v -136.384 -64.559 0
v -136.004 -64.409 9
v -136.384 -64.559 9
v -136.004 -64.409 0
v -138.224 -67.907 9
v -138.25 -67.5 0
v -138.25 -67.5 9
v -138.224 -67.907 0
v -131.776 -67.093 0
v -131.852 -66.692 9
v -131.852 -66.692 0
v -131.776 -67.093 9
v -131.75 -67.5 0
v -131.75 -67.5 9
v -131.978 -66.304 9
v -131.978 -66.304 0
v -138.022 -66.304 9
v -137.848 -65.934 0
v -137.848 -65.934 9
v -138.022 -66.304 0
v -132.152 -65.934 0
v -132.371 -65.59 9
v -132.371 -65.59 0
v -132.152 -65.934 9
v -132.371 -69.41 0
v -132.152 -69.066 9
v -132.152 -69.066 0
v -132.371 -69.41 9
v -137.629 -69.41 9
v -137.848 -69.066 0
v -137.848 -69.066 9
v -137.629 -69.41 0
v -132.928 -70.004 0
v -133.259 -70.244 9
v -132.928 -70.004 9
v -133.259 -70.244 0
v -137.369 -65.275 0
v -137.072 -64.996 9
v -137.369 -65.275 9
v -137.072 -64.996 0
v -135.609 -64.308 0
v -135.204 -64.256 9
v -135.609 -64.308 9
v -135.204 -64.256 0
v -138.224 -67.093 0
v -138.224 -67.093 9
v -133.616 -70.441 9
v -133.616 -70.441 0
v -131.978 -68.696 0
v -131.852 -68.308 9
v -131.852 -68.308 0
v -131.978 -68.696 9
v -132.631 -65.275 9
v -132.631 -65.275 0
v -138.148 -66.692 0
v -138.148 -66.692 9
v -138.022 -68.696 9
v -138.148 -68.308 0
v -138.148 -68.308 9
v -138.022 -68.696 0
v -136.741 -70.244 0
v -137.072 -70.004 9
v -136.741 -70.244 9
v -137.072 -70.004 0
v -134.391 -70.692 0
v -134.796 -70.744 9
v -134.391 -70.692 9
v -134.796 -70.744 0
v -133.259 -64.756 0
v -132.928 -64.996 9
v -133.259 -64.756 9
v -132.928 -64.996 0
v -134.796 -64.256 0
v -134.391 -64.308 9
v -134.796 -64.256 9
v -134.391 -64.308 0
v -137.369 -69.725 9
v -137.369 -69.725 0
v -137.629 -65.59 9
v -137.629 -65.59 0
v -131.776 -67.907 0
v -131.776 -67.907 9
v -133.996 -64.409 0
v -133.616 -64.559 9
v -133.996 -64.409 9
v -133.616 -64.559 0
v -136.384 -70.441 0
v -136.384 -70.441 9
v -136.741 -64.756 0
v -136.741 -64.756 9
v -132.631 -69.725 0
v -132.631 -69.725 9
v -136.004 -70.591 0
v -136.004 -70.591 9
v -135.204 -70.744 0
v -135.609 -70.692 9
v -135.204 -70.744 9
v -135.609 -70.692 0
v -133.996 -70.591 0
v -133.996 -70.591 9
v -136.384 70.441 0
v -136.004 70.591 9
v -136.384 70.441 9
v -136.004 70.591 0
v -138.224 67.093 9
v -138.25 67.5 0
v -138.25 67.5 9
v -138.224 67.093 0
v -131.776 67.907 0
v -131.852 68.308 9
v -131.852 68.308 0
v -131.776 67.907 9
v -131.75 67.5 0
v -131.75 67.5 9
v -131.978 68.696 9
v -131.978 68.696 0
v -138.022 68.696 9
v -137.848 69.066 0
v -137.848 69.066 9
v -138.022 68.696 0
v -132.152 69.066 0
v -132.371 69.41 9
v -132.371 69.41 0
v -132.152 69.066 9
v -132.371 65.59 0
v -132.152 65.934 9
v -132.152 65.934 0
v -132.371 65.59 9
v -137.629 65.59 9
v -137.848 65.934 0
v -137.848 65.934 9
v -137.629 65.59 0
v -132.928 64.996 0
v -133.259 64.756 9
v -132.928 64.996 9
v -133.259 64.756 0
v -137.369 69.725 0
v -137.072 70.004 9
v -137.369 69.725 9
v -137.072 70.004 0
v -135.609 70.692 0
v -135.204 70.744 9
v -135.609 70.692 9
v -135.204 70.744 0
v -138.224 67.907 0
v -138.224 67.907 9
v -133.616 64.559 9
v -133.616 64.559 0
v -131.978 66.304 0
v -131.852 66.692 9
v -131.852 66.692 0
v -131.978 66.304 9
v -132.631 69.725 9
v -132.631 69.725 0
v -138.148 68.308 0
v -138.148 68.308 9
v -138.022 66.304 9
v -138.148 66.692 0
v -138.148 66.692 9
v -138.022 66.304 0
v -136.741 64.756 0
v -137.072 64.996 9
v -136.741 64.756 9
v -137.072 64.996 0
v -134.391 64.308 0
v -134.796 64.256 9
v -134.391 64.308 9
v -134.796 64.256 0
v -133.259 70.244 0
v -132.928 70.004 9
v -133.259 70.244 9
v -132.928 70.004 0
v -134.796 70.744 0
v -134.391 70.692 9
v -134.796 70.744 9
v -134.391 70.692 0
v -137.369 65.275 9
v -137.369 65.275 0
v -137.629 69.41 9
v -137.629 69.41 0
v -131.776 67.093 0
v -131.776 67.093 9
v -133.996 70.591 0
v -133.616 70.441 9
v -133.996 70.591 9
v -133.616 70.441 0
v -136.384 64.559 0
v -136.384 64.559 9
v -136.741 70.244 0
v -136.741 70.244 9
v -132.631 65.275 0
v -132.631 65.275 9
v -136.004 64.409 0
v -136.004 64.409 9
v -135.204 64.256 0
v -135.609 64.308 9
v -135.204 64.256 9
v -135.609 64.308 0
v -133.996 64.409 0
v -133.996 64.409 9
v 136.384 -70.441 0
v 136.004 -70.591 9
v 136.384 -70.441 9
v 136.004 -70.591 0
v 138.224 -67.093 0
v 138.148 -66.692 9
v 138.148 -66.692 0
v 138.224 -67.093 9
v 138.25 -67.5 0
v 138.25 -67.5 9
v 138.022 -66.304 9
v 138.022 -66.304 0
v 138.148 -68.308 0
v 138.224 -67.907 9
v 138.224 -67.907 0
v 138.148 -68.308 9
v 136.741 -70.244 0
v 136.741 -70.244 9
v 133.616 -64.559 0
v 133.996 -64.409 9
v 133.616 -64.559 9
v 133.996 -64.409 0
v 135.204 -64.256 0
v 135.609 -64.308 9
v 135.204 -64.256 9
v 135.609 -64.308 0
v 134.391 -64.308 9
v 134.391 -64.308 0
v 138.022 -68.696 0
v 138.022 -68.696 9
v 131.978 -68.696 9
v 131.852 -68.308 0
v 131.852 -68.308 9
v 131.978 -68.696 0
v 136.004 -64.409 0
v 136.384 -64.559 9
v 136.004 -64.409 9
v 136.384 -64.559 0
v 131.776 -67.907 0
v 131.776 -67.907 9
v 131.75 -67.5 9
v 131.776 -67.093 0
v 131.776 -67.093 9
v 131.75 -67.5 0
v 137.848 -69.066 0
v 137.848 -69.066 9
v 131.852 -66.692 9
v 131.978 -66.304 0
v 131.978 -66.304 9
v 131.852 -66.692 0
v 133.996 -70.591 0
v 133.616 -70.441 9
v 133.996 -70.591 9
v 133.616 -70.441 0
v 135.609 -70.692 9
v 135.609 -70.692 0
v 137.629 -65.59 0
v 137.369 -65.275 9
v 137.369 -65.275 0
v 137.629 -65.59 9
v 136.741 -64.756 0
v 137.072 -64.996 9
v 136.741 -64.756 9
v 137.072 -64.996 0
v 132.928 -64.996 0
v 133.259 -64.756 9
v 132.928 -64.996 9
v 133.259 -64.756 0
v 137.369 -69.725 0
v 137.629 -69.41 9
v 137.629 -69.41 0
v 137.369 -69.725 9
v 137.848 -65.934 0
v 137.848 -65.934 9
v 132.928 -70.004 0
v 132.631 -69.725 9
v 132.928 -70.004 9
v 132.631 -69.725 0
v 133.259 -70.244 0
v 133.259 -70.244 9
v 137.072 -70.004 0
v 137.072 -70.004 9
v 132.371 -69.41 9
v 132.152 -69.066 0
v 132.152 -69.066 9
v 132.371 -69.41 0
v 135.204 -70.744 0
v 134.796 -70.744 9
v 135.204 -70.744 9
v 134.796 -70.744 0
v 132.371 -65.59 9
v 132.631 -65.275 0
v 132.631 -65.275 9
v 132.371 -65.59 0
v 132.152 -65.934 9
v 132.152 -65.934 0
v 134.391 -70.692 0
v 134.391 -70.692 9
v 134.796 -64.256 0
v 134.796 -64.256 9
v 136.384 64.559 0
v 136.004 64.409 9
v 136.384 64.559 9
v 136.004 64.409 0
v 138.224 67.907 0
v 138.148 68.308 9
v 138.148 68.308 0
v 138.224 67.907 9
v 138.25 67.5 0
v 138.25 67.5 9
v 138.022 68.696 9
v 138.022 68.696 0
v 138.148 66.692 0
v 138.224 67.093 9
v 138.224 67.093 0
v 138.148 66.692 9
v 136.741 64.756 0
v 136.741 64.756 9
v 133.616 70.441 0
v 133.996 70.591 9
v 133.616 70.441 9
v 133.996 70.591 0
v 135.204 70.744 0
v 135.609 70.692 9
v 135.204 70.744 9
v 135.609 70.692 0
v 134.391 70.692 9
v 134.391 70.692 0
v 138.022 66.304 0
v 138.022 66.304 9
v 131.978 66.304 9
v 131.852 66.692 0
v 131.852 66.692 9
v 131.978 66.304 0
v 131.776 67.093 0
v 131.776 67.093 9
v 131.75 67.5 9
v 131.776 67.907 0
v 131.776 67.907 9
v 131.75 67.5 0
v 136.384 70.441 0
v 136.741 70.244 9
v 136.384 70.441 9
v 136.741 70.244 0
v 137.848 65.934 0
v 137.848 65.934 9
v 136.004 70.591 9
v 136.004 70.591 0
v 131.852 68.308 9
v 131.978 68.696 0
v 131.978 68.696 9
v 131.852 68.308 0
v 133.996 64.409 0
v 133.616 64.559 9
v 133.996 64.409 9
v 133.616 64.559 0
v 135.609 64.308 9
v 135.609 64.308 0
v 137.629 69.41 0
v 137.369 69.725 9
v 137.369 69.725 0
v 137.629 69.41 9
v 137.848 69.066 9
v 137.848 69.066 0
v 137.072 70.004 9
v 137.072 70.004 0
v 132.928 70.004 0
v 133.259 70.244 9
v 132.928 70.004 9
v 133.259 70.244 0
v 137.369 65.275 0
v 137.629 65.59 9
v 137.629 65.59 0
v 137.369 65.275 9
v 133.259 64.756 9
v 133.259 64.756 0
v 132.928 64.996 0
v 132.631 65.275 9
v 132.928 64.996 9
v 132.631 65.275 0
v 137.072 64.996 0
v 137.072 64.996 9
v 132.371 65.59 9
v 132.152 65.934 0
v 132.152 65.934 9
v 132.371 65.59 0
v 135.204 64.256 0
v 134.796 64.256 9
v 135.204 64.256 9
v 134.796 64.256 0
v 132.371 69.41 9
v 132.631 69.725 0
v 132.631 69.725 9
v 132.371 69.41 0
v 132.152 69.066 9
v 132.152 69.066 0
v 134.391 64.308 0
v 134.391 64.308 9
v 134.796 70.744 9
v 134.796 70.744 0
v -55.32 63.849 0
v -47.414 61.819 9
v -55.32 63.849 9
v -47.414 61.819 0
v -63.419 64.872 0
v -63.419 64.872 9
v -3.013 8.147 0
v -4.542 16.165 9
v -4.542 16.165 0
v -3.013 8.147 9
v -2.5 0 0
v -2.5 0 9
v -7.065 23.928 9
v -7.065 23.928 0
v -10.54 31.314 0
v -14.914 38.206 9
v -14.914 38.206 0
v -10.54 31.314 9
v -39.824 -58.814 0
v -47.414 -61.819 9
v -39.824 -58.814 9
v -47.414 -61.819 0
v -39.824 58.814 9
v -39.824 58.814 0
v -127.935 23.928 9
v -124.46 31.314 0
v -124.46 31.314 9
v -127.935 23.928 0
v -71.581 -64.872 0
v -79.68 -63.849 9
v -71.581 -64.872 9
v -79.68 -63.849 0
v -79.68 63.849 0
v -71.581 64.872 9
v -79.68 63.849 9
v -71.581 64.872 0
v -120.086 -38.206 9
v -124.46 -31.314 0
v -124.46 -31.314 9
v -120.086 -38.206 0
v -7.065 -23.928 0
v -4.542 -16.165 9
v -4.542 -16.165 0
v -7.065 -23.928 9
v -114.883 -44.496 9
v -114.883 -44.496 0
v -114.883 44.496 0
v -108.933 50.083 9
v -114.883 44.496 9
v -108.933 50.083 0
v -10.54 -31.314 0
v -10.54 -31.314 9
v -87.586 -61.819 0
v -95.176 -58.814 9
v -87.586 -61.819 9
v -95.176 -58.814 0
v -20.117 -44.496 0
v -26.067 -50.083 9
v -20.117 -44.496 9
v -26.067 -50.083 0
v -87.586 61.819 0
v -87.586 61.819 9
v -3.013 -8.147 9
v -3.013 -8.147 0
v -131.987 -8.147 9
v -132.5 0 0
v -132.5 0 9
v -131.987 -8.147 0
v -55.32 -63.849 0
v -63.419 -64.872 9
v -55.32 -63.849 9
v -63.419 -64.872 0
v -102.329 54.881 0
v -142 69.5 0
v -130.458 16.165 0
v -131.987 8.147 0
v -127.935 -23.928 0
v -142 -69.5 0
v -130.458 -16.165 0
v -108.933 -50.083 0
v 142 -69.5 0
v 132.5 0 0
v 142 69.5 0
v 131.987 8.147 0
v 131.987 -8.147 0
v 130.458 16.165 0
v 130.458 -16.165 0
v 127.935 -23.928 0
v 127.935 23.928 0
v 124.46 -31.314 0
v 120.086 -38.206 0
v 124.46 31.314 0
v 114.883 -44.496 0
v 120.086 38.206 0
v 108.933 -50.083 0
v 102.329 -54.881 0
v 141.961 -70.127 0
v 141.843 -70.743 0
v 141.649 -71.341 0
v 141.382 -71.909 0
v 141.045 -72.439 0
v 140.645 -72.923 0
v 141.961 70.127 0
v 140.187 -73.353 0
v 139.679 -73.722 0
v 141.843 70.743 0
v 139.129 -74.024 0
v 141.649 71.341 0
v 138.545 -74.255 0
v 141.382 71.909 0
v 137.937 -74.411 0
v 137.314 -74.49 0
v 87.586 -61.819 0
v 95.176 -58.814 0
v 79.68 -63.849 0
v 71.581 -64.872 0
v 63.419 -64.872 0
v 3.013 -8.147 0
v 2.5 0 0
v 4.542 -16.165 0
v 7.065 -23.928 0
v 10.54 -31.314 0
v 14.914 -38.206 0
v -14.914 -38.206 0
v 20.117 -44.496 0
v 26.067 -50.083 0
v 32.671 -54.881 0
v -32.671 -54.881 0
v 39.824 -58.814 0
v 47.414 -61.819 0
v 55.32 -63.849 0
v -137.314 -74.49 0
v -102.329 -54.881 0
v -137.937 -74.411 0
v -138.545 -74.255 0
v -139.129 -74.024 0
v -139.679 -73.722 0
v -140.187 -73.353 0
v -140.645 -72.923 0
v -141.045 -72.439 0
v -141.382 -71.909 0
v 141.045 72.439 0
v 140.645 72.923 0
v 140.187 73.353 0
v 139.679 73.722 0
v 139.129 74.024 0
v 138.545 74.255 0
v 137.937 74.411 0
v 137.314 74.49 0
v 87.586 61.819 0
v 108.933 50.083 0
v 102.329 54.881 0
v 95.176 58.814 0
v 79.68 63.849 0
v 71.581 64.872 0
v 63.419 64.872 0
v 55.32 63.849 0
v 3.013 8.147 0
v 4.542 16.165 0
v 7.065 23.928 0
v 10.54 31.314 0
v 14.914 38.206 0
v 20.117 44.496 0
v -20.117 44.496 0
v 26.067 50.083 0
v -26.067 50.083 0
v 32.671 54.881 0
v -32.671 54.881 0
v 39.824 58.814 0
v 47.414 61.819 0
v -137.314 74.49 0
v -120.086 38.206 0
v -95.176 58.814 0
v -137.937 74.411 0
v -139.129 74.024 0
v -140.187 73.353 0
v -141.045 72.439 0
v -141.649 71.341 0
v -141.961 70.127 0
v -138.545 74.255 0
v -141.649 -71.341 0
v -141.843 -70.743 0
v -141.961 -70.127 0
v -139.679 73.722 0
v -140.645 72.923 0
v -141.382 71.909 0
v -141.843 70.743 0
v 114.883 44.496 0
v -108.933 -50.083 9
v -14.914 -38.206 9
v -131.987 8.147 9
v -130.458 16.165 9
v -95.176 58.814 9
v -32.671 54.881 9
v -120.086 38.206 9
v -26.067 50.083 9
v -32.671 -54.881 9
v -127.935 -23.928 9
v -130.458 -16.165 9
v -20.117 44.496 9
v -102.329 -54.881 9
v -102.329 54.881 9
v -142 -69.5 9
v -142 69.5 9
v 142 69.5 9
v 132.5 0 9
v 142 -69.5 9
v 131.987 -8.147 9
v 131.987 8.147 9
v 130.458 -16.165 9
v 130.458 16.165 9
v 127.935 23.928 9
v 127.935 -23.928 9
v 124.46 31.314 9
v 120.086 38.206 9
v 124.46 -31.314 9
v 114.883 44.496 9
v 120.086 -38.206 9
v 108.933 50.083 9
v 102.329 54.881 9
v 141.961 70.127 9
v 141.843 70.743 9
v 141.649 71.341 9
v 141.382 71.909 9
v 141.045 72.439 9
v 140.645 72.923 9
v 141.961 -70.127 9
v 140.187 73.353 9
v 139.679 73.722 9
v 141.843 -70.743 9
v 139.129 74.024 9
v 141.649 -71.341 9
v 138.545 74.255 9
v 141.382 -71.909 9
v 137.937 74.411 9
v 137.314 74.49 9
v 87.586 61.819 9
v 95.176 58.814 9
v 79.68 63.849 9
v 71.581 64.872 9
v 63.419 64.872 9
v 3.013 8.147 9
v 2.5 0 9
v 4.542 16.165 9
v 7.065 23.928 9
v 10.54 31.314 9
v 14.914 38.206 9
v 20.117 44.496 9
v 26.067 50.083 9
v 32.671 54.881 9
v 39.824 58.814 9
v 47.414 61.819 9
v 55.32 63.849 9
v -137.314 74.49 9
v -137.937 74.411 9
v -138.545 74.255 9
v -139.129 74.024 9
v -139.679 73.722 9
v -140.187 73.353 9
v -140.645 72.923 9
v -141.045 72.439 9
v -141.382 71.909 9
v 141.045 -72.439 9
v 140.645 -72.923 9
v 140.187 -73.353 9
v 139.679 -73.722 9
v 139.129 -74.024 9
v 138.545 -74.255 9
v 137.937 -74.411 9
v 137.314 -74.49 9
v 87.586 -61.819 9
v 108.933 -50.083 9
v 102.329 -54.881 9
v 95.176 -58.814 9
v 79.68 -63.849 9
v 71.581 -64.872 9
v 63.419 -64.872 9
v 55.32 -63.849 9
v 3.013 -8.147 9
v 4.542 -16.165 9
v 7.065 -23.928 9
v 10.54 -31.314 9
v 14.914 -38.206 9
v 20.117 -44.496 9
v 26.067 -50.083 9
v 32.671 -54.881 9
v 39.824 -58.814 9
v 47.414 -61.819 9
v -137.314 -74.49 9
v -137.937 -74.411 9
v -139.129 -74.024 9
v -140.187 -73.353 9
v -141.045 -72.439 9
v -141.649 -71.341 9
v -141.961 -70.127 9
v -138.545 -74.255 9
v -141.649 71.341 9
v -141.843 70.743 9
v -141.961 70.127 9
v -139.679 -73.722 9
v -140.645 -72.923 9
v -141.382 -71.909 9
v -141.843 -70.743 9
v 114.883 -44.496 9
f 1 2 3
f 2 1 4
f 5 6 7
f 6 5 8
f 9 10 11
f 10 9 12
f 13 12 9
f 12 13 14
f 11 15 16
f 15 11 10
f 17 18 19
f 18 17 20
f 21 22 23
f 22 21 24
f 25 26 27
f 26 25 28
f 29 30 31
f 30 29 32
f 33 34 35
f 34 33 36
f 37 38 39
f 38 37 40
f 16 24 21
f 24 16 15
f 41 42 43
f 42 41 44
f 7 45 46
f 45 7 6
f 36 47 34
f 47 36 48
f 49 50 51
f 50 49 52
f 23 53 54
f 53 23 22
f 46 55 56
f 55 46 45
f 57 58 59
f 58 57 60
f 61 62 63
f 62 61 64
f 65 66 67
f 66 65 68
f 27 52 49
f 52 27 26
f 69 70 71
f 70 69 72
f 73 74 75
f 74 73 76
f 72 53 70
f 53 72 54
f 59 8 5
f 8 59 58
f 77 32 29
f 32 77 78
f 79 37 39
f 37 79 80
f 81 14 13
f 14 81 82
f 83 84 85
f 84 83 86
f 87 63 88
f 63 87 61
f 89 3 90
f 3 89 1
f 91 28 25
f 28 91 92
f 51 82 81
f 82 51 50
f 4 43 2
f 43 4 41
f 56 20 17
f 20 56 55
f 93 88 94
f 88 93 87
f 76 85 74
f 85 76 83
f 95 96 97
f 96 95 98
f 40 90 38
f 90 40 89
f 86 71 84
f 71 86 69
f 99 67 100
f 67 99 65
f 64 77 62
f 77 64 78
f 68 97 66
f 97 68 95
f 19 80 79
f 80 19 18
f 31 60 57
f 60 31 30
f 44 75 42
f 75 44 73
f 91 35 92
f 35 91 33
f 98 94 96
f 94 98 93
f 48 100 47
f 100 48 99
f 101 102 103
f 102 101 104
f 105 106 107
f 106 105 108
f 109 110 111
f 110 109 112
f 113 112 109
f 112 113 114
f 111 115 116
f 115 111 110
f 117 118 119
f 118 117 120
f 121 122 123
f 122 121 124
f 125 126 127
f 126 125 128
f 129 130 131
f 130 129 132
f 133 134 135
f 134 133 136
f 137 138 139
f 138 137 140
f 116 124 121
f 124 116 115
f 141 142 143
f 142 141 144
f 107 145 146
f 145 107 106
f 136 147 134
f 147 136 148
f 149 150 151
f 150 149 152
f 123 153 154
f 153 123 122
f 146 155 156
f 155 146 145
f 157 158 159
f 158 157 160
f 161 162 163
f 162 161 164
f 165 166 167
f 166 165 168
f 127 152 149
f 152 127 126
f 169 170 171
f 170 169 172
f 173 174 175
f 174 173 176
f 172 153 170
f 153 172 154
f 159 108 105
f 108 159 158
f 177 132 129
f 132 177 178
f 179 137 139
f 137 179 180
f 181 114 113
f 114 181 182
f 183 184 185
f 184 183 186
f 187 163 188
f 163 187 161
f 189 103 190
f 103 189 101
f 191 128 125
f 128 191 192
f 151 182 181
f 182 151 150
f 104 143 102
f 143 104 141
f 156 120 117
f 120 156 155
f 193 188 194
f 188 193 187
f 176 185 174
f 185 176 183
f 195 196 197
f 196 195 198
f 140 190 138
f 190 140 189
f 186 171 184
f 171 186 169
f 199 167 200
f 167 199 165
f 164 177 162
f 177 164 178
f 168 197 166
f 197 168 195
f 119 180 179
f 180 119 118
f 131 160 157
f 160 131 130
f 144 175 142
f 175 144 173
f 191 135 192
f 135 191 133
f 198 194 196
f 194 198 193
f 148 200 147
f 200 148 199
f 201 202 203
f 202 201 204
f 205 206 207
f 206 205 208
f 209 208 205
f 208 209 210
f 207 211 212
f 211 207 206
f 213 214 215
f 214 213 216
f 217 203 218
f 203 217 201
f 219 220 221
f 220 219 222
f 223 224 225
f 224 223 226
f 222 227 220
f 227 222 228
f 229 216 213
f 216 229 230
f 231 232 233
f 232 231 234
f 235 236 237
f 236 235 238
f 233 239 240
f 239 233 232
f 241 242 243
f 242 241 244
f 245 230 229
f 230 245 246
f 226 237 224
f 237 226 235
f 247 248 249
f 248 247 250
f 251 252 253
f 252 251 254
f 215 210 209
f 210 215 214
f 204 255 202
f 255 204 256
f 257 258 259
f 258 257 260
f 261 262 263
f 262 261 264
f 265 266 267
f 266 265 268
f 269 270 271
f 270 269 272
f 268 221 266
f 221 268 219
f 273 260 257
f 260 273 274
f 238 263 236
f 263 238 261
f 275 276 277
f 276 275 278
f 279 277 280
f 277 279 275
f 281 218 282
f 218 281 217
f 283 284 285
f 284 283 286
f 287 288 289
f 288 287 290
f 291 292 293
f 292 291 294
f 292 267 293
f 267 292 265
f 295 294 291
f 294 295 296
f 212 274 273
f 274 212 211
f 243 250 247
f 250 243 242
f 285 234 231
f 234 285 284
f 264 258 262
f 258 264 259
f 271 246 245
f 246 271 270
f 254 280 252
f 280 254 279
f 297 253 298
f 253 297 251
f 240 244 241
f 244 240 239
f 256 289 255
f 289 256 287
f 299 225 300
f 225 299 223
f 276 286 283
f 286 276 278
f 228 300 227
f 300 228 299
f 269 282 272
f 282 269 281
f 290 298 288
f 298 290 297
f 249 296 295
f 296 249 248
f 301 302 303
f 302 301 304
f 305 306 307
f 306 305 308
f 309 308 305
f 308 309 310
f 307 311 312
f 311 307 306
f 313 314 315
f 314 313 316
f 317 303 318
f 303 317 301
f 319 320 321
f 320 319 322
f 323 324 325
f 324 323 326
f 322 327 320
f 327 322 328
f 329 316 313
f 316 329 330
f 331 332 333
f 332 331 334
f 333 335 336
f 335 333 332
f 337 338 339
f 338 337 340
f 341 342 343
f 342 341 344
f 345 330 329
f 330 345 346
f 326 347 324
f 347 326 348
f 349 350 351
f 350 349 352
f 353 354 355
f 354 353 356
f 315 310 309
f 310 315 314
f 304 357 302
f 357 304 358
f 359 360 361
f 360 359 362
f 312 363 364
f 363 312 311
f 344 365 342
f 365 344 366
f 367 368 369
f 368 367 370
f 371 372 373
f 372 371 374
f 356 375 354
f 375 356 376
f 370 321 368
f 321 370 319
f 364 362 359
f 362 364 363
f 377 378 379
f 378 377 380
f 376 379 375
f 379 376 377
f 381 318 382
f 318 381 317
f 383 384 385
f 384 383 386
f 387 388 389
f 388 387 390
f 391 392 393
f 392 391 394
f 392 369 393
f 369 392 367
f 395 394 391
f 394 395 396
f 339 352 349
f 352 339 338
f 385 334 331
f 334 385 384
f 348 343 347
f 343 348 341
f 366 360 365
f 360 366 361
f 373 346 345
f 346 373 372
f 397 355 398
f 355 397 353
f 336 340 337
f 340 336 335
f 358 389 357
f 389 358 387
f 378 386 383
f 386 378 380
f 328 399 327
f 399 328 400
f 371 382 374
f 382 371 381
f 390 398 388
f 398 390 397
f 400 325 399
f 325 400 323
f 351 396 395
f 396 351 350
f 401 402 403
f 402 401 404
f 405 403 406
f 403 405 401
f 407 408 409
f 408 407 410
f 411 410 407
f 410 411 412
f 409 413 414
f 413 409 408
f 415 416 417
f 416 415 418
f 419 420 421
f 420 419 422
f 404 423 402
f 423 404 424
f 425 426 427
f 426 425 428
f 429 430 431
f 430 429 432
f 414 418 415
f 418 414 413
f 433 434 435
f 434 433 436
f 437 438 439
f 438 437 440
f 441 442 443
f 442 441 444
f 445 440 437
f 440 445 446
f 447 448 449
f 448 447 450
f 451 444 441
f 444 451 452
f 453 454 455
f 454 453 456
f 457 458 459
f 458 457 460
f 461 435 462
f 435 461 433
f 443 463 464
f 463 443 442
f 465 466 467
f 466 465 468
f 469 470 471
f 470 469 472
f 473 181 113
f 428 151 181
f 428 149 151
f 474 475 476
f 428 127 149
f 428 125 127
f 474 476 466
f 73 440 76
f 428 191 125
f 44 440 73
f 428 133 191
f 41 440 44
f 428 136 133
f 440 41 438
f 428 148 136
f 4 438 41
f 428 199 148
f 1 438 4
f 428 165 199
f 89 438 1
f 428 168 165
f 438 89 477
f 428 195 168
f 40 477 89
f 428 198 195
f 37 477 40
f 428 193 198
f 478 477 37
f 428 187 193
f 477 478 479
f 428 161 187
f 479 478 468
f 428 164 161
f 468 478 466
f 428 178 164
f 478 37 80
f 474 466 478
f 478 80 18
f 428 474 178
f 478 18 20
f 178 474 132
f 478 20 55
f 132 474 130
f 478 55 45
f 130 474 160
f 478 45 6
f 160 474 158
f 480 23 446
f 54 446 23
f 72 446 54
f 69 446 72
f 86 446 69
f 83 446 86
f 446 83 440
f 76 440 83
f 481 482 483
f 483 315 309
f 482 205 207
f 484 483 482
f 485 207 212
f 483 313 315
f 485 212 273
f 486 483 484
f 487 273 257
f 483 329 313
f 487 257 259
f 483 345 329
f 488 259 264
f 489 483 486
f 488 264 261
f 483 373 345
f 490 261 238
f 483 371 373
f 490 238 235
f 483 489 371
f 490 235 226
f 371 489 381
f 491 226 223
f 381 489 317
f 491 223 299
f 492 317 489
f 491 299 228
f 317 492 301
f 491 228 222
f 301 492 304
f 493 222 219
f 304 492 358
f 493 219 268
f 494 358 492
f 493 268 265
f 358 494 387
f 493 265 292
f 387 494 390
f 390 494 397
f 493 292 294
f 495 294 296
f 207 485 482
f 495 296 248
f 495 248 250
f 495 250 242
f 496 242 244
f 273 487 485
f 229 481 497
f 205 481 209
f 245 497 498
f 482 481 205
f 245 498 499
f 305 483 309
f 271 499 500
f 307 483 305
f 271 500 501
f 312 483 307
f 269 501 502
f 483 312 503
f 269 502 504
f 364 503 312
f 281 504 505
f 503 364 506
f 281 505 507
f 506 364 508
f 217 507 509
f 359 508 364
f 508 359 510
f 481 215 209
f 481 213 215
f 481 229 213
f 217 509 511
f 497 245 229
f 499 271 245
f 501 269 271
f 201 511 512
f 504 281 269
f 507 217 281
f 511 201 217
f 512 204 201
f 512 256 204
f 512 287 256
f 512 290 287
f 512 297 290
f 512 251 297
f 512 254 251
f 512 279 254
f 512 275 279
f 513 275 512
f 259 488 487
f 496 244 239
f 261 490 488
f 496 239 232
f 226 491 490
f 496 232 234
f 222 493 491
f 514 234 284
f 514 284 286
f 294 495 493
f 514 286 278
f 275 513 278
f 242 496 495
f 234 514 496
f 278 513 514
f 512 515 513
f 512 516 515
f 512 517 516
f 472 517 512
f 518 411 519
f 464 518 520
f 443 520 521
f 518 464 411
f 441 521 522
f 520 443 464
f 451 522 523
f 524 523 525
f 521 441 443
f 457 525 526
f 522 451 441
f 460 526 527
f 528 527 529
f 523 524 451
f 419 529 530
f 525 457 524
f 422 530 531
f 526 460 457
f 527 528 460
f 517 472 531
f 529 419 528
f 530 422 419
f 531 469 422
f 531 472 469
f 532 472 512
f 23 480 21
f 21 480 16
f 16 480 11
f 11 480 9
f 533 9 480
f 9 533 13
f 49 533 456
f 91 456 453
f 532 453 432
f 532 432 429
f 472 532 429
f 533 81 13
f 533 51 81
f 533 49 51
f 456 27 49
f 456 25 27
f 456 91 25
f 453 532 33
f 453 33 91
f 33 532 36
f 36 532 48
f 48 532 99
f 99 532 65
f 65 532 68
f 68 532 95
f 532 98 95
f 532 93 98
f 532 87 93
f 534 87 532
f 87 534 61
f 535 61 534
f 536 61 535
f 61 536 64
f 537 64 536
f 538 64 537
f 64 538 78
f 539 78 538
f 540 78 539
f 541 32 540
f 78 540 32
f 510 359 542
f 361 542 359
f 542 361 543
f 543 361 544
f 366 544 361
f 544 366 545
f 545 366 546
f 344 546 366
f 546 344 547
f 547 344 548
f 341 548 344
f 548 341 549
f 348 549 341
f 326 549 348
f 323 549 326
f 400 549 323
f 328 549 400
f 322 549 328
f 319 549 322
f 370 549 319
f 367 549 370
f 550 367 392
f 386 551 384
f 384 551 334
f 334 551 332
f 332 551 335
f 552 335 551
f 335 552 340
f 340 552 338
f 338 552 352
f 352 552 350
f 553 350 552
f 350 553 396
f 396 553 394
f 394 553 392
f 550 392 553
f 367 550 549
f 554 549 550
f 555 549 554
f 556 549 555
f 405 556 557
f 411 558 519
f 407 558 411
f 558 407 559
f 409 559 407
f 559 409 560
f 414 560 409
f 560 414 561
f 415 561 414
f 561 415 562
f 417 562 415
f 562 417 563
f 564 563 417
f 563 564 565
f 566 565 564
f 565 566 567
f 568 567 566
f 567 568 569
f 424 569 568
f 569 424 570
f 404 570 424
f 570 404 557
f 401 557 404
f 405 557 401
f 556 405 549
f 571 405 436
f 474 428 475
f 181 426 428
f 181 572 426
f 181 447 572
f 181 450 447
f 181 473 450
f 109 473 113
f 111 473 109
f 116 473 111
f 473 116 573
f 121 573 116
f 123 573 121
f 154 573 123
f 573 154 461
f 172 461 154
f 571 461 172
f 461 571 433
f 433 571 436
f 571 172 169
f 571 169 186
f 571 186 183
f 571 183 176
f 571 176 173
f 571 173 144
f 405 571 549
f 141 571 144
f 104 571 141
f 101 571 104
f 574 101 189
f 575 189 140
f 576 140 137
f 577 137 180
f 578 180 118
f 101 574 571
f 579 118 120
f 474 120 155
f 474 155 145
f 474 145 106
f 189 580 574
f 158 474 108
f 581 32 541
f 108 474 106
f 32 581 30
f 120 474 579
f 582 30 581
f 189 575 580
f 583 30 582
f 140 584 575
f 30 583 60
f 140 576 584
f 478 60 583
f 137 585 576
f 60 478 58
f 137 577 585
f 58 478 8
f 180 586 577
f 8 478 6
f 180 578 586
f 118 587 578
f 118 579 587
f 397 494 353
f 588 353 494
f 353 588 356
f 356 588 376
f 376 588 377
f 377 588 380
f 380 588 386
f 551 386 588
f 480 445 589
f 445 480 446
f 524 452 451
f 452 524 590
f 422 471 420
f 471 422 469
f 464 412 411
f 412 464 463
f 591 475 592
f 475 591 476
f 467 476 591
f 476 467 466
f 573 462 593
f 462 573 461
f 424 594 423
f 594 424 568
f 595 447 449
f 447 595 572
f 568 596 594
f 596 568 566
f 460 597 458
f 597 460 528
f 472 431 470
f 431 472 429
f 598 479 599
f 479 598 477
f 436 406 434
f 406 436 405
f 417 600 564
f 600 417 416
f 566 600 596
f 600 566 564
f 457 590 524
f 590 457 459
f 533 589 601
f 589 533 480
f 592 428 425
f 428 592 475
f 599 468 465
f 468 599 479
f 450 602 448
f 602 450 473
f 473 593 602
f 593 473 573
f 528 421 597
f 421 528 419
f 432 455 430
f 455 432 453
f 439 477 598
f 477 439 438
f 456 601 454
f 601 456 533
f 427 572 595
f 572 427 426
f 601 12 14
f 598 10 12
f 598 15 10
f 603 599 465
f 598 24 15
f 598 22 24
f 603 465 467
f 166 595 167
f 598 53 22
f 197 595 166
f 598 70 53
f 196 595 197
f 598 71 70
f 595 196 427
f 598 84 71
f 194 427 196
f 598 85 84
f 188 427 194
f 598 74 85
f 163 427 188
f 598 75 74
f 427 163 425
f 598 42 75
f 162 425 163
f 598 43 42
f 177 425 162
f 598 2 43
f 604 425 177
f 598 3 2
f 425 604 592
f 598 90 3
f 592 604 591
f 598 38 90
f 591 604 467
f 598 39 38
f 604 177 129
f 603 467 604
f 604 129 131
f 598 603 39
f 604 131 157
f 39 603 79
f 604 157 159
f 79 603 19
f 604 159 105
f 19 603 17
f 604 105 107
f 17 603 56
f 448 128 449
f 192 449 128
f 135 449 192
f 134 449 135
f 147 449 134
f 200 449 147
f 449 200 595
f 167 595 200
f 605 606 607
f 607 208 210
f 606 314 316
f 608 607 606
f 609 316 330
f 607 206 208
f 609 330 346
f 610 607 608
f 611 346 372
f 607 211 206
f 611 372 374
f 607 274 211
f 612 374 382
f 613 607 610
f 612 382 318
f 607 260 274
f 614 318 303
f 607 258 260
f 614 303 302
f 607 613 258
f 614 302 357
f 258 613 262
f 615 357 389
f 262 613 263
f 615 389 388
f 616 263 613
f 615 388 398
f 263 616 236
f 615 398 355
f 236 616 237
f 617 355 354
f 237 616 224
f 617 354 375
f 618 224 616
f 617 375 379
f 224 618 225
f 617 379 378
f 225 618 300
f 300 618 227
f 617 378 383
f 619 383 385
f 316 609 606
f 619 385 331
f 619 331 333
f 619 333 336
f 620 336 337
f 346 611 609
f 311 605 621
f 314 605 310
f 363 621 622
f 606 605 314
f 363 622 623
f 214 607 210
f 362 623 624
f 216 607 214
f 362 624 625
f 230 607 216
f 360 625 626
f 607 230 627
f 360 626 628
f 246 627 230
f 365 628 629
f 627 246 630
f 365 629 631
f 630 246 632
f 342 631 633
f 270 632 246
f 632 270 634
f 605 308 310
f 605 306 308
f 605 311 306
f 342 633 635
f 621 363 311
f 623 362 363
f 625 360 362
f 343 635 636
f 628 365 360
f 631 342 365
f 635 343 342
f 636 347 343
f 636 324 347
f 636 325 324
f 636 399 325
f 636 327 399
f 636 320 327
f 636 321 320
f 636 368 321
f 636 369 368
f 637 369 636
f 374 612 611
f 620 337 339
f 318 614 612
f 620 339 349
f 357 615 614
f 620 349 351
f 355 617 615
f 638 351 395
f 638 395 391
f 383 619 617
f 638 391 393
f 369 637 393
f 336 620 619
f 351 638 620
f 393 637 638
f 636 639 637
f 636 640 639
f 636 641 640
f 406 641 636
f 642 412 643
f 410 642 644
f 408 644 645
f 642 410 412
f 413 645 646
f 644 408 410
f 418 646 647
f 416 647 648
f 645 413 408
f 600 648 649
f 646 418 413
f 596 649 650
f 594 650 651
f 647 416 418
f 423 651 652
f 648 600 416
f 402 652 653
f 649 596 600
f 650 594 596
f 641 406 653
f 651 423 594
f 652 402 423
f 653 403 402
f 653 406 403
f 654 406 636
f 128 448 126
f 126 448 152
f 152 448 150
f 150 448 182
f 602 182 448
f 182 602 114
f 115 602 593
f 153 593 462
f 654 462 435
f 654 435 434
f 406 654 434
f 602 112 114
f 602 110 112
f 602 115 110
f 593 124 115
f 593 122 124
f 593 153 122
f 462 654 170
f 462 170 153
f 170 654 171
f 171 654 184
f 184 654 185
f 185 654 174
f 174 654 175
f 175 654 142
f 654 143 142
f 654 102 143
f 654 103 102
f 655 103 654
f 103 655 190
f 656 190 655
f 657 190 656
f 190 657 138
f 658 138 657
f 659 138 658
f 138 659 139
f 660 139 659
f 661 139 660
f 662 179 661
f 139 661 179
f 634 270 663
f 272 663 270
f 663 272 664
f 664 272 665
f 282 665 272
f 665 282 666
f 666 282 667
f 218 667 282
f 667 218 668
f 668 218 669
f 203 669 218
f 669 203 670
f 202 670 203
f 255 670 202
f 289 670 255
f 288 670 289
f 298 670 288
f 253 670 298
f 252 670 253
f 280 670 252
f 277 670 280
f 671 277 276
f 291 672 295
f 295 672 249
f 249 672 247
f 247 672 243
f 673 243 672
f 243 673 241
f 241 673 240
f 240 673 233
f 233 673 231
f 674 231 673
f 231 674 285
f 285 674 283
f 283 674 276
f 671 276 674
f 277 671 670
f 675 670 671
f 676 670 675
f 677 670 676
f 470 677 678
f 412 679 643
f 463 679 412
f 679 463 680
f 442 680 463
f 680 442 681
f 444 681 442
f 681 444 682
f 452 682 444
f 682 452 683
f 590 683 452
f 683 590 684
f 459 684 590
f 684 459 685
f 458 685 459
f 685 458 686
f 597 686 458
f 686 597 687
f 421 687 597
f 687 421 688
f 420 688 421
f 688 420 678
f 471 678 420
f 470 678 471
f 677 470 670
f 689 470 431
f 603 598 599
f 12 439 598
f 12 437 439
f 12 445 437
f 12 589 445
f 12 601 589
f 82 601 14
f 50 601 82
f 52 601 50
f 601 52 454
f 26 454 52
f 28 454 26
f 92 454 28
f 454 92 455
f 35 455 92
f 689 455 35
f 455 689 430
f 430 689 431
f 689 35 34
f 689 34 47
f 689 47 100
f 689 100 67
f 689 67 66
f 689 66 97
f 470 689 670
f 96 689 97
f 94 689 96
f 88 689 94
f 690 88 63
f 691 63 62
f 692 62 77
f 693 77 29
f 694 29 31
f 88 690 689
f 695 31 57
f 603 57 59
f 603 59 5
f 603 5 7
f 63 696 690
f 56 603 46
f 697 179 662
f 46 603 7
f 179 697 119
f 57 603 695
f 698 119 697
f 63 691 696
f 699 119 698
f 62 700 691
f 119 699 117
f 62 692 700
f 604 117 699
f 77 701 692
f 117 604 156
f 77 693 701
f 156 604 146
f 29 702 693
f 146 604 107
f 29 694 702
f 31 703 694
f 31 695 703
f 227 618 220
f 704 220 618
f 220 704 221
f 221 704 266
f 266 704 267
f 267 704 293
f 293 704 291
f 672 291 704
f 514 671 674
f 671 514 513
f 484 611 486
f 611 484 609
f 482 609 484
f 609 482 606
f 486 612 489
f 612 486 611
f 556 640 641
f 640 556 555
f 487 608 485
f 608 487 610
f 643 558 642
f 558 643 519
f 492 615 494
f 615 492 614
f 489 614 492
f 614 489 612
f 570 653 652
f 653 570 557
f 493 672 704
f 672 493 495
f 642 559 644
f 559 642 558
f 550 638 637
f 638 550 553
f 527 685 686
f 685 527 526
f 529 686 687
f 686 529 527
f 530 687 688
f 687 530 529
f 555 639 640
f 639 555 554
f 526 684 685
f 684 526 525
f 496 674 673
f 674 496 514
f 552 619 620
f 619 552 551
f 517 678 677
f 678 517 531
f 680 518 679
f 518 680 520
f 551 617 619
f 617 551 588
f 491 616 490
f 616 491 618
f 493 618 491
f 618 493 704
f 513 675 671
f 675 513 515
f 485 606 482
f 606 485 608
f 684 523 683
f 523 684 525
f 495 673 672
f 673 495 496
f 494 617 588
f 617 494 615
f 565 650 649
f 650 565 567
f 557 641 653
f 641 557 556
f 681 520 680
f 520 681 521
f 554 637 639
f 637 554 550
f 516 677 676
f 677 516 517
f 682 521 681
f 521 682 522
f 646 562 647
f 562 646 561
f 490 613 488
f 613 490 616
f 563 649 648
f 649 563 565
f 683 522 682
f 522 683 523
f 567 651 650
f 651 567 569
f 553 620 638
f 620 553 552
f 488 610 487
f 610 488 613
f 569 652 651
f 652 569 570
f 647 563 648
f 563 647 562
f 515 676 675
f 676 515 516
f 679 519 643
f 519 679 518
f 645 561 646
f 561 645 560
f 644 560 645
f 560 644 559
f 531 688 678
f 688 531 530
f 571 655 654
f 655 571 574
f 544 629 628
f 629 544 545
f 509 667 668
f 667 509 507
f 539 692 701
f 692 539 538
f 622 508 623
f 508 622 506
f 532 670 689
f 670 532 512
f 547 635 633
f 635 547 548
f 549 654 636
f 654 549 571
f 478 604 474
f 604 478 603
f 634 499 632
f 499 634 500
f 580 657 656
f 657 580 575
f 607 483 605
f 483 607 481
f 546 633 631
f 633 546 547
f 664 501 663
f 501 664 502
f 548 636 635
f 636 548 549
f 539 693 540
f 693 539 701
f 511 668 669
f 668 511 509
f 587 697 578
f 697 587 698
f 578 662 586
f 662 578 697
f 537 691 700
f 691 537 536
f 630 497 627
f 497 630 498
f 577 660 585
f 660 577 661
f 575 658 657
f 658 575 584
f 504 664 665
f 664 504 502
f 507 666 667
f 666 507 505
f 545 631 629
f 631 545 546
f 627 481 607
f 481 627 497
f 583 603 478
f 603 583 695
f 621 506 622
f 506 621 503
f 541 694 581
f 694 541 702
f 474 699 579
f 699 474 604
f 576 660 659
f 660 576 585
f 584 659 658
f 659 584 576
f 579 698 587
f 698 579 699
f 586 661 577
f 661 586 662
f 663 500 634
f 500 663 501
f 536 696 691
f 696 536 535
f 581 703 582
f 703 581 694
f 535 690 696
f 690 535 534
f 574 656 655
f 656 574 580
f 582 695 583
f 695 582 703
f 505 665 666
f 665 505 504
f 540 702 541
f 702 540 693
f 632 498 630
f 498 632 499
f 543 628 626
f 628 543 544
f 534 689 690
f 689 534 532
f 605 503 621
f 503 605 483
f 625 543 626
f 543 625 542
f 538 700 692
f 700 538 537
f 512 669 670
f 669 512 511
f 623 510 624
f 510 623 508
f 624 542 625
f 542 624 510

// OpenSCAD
$fn = 50;


difference() {
	union() {
		hull() {
			translate(v = [-137.0000000000, 69.5000000000, 0]) {
				cylinder(h = 9, r = 5);
			}
			translate(v = [137.0000000000, 69.5000000000, 0]) {
				cylinder(h = 9, r = 5);
			}
			translate(v = [-137.0000000000, -69.5000000000, 0]) {
				cylinder(h = 9, r = 5);
			}
			translate(v = [137.0000000000, -69.5000000000, 0]) {
				cylinder(h = 9, r = 5);
			}
		}
	}
	union() {
		#translate(v = [-135.0000000000, -67.5000000000, -100.0000000000]) {
			cylinder(h = 200, r = 3.2500000000);
		}
		#translate(v = [-135.0000000000, 67.5000000000, -100.0000000000]) {
			cylinder(h = 200, r = 3.2500000000);
		}
		#translate(v = [135.0000000000, -67.5000000000, -100.0000000000]) {
			cylinder(h = 200, r = 3.2500000000);
		}
		#translate(v = [135.0000000000, 67.5000000000, -100.0000000000]) {
			cylinder(h = 200, r = 3.2500000000);
		}
		#translate(v = [-67.5000000000, 0, 0]) {
			cylinder(h = 9, r = 65.0000000000);
		}
		#translate(v = [67.5000000000, 0, 0]) {
			cylinder(h = 9, r = 65.0000000000);
		}
	}
}
